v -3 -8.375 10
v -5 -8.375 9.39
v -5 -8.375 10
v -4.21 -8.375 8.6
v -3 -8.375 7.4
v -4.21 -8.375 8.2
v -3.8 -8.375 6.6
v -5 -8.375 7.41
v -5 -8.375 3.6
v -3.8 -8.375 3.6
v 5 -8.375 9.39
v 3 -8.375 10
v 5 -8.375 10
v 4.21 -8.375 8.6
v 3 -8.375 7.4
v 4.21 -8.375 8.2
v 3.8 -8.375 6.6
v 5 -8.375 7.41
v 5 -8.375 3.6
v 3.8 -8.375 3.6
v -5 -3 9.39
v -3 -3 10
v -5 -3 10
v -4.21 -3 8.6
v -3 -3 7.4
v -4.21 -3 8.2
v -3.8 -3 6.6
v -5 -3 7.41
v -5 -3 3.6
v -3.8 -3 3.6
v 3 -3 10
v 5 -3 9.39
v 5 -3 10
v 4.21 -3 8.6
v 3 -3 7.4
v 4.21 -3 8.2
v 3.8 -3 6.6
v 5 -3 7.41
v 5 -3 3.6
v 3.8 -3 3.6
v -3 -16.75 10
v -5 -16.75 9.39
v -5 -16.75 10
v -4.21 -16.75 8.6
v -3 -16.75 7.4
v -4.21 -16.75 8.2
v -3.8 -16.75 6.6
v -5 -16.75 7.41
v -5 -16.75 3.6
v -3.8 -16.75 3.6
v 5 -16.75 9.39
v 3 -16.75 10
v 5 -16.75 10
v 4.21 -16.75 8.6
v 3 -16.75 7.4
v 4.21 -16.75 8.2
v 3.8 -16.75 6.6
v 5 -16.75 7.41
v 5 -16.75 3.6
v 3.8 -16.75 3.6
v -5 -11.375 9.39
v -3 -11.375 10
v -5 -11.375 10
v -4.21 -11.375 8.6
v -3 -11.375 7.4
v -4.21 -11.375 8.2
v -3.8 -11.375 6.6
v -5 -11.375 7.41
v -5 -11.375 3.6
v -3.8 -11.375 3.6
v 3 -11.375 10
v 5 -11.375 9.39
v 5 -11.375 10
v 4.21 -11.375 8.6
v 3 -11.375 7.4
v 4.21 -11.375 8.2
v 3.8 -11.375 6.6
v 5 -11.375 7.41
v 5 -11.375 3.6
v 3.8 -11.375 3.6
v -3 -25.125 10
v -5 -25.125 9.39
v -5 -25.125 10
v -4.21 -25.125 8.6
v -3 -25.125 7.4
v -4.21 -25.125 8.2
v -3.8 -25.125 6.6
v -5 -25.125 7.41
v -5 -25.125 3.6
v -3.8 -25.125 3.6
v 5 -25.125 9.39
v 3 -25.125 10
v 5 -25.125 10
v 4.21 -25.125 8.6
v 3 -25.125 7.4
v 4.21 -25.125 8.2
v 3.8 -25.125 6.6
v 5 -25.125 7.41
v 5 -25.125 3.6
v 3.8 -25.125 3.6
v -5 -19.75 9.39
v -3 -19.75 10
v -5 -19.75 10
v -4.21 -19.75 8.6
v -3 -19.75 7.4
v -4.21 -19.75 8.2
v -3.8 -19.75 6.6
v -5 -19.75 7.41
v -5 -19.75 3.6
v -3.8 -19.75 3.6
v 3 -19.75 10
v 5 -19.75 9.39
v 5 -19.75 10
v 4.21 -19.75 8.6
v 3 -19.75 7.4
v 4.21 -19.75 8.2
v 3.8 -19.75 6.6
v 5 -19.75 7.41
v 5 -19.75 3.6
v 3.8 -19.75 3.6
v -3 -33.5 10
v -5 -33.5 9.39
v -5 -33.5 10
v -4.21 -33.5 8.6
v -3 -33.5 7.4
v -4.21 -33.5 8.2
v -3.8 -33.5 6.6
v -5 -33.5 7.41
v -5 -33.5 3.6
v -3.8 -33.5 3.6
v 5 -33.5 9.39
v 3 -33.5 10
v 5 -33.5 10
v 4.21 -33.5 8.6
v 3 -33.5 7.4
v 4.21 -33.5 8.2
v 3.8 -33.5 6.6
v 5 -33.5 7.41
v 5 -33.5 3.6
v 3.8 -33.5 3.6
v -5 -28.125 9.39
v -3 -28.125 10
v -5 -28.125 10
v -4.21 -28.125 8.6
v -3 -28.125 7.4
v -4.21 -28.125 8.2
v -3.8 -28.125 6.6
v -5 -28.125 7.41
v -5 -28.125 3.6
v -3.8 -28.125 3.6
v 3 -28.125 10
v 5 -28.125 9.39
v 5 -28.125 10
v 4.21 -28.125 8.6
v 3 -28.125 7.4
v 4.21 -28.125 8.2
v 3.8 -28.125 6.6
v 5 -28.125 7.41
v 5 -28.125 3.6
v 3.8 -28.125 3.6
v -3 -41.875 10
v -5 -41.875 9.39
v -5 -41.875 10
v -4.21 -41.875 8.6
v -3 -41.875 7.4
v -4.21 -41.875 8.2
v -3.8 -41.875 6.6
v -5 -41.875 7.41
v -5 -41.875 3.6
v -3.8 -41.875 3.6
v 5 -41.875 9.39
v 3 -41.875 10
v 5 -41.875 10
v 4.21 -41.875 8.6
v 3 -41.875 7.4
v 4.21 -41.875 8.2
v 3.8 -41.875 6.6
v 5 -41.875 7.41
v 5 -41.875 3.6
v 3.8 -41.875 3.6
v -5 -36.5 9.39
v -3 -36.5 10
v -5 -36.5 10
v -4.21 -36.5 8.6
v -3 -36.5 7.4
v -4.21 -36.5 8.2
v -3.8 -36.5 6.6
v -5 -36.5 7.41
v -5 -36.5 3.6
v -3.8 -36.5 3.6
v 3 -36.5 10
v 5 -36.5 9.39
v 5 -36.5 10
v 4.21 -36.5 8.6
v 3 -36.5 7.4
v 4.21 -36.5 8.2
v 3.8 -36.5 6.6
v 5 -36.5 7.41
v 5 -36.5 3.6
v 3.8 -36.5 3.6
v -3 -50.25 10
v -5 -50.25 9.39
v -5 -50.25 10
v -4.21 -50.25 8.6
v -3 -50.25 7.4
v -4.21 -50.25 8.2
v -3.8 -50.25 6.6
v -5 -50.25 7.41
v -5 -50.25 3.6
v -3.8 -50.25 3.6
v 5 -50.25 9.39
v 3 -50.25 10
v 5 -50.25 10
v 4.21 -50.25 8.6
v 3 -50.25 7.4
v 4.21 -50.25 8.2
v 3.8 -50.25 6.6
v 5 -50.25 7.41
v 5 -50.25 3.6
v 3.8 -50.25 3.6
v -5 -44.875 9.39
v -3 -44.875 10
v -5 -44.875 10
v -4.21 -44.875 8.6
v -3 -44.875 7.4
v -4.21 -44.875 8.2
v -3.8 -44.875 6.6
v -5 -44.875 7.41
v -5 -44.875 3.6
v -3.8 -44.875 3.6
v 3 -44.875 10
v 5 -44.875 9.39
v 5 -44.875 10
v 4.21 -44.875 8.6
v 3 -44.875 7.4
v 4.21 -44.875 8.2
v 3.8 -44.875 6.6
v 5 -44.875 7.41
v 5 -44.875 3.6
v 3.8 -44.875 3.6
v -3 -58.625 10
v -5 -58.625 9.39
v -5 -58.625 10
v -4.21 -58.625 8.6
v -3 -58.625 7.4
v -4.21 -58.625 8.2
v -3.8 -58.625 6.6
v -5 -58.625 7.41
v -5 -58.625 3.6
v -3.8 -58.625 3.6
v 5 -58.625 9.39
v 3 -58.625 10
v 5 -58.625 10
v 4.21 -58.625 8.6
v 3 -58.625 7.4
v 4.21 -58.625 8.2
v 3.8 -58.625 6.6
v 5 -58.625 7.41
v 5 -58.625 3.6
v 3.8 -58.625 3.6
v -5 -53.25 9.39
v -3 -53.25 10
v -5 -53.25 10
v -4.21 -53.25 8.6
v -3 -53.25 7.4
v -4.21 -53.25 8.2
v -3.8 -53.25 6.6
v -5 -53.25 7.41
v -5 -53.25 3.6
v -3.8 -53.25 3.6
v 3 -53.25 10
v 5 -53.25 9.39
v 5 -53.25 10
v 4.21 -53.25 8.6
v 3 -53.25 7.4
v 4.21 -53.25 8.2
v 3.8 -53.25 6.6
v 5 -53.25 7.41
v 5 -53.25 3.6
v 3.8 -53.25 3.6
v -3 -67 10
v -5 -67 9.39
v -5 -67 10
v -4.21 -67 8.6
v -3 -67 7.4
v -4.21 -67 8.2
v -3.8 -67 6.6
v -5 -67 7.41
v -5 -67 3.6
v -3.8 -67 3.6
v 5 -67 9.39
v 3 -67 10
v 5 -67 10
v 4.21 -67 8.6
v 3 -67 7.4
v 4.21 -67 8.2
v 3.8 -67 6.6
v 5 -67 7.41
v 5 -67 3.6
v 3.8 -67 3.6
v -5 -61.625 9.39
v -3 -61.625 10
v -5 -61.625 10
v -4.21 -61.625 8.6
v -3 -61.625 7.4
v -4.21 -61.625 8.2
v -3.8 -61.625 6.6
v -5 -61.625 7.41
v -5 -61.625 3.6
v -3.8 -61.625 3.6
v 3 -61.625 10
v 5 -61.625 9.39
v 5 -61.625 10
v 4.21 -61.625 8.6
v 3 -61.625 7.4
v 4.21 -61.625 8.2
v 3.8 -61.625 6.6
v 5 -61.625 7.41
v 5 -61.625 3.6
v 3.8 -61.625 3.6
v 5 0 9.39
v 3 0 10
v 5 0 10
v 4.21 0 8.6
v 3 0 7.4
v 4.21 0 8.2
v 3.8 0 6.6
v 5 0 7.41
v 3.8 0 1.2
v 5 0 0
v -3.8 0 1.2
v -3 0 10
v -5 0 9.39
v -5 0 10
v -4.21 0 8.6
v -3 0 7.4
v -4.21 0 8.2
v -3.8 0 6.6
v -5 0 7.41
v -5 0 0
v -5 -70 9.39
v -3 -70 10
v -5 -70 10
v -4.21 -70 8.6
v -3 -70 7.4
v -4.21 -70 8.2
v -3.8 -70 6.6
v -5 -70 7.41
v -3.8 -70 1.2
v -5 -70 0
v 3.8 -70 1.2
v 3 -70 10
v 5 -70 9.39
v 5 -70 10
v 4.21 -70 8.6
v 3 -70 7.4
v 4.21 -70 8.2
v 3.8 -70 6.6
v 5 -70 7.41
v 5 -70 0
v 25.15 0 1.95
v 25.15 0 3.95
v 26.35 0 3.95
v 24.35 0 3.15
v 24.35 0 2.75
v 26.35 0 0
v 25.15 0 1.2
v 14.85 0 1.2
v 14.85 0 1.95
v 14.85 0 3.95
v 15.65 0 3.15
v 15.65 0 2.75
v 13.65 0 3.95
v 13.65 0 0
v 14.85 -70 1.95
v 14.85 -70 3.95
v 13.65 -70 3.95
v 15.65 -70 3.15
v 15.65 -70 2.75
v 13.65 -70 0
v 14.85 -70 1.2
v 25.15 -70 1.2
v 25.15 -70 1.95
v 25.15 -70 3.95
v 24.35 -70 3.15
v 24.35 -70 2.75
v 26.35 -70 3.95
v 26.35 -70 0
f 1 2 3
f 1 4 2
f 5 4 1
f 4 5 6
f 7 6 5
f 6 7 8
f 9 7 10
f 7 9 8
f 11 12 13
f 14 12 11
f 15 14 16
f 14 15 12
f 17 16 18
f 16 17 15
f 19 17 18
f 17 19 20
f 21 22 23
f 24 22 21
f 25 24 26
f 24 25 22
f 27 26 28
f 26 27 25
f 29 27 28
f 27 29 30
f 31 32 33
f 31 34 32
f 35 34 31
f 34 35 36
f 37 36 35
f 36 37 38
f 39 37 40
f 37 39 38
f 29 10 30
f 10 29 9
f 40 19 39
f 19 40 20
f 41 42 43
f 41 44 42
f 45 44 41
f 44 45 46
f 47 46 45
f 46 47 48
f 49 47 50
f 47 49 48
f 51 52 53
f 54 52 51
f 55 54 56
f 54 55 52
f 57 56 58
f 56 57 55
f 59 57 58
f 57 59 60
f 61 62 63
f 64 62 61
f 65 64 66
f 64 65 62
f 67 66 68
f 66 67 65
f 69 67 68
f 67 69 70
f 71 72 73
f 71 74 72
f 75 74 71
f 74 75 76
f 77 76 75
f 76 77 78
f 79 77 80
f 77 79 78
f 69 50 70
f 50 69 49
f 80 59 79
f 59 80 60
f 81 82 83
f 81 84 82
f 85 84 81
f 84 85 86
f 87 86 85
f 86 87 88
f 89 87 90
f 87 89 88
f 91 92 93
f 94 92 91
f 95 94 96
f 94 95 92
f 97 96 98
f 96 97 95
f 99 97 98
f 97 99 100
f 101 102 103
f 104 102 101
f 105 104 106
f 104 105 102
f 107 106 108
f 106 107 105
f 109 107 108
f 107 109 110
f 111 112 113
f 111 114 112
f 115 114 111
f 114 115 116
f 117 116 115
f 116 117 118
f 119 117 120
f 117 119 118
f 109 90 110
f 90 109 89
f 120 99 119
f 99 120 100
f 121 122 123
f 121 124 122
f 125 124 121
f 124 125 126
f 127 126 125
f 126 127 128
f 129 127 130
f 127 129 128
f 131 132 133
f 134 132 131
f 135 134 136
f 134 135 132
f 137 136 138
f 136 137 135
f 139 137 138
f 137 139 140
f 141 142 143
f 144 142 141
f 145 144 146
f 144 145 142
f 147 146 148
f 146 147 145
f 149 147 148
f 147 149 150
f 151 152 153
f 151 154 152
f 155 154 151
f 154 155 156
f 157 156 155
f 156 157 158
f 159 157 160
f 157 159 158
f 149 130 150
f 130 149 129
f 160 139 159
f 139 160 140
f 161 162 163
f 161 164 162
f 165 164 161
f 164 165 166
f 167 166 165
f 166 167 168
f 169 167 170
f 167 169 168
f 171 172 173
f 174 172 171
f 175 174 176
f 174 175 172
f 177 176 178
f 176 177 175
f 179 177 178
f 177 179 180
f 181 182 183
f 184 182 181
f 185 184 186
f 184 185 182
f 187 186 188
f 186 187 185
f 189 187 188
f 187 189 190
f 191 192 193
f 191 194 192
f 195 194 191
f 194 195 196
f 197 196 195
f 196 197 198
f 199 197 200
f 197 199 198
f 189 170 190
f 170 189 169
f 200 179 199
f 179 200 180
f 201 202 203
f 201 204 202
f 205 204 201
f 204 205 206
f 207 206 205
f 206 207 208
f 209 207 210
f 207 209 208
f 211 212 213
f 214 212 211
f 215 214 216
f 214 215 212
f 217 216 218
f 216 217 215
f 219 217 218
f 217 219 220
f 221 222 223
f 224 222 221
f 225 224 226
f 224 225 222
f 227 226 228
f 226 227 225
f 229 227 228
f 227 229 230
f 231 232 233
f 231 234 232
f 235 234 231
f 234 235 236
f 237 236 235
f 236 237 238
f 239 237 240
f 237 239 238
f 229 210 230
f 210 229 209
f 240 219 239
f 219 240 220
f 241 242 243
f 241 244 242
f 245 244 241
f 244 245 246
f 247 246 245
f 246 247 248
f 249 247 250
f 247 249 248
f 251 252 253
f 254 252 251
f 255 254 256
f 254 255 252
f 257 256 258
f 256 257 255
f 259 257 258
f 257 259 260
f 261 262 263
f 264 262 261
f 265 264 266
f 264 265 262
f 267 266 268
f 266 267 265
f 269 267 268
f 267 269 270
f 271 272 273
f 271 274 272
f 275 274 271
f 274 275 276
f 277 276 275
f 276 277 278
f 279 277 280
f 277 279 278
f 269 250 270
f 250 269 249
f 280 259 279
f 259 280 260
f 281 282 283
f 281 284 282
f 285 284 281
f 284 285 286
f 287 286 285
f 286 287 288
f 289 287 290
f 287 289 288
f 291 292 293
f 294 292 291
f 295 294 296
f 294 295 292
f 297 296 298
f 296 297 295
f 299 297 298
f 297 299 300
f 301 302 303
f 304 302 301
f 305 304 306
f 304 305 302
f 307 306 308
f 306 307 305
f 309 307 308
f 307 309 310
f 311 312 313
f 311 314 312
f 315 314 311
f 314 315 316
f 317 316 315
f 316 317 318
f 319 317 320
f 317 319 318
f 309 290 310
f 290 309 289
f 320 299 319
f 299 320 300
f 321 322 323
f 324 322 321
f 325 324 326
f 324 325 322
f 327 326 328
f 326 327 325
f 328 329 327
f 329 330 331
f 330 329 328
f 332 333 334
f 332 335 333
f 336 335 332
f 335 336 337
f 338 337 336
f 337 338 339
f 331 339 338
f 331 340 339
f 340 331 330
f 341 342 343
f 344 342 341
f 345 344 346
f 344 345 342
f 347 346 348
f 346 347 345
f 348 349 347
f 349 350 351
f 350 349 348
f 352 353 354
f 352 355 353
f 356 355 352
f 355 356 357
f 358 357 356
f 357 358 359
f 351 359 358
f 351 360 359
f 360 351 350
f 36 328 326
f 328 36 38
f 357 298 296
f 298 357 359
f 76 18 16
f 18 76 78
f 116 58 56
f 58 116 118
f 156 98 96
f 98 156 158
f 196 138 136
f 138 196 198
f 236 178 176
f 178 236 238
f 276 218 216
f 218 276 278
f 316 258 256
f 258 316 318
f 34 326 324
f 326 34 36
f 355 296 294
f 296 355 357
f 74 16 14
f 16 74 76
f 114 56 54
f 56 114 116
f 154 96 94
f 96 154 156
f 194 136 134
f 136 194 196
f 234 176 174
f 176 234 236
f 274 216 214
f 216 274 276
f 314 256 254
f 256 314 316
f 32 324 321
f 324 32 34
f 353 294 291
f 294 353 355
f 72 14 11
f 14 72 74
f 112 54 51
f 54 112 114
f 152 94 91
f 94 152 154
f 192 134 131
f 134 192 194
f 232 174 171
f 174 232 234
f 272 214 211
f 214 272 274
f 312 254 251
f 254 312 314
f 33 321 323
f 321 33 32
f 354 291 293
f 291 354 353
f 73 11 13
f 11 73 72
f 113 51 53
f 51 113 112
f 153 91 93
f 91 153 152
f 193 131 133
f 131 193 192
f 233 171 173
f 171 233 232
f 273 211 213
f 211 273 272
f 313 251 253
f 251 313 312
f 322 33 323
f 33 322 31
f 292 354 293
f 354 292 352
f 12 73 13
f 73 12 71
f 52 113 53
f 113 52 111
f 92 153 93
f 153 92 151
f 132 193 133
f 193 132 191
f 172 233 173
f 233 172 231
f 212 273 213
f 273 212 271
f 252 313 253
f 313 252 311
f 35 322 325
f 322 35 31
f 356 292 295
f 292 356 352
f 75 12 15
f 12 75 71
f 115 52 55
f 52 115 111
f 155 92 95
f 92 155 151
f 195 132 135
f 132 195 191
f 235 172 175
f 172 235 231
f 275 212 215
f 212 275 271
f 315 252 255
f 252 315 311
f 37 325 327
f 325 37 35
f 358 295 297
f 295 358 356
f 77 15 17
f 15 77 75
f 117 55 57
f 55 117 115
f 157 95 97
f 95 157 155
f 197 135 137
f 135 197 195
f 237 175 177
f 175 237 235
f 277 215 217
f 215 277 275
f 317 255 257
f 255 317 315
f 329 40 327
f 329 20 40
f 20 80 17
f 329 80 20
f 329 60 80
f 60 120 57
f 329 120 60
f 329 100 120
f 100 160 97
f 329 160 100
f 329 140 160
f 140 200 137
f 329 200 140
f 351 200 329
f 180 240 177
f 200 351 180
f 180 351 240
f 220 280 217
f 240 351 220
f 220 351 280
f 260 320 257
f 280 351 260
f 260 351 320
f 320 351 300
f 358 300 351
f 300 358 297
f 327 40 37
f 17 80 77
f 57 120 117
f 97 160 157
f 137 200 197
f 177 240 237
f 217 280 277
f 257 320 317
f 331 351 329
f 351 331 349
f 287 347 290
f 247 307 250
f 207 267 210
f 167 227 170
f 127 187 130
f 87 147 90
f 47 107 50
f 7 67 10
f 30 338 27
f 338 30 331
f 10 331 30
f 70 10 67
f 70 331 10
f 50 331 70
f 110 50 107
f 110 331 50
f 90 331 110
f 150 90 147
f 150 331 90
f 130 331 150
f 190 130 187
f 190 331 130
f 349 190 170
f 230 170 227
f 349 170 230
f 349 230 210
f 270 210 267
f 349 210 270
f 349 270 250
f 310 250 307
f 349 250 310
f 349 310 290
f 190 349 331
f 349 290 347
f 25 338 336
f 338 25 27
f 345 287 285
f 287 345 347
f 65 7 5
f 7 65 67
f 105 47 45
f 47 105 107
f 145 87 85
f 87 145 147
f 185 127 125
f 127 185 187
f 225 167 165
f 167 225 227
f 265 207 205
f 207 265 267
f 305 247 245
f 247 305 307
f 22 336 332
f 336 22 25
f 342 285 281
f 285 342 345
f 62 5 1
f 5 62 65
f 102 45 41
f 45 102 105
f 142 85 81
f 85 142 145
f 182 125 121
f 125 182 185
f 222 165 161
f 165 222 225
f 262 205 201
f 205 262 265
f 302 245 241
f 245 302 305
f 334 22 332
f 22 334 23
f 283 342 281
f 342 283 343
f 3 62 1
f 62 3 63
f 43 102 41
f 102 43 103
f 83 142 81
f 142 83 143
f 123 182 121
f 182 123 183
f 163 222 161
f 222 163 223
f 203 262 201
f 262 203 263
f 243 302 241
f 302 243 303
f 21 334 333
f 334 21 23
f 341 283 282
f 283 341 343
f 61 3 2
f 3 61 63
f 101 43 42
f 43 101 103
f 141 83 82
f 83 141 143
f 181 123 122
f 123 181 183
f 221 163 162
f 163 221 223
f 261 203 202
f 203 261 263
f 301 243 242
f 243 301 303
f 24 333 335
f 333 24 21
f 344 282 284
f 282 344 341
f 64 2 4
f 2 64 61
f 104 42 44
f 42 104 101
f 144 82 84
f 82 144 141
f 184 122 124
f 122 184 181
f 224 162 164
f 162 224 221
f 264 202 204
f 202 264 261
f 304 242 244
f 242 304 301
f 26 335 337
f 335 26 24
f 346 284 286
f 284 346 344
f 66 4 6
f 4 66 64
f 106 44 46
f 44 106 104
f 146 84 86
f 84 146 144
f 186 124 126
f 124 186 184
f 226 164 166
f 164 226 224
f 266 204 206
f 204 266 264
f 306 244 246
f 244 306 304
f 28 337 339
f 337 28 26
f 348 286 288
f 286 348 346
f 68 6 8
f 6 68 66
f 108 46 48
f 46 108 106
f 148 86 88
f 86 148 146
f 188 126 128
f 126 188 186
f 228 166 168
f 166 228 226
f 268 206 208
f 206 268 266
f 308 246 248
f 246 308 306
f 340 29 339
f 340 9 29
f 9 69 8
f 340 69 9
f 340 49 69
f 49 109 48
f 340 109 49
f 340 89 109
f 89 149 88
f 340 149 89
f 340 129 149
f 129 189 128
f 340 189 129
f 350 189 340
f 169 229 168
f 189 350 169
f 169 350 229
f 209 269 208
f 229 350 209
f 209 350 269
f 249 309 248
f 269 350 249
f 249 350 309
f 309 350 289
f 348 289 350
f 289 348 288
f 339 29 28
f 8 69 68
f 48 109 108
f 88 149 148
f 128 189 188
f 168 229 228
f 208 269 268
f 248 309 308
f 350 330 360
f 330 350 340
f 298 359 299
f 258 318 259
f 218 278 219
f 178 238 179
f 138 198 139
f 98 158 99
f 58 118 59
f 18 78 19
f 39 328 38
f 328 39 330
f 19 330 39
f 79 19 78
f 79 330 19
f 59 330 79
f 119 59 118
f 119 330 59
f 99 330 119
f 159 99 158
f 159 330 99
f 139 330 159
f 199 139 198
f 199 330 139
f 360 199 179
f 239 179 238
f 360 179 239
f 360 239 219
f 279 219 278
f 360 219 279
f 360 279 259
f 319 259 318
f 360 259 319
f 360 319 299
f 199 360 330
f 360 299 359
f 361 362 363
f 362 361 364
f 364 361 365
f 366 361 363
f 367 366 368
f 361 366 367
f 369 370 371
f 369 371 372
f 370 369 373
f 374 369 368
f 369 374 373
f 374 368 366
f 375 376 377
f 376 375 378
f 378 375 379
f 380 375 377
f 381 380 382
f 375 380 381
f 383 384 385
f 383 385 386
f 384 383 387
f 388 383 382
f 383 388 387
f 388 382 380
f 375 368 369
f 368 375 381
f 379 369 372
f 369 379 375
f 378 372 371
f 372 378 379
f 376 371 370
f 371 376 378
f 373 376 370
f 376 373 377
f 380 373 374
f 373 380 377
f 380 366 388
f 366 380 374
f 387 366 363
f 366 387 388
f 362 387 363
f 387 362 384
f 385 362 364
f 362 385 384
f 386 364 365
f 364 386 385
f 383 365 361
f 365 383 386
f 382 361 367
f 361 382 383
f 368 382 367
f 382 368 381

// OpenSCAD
/*
 * Parametric cable duct with cover
 * ========================================
 *
 * Create your own custom cable duct with desired dimensions and matching top cover.
 *
 * Created by Thomas Hessling <mail@dream-dimensions.de>. 
 * License: Creative Commons - Attribution - Non-Commercial - Share Alike
 *
 * https://www.dream-dimensions.de
 * https://www.thingiverse.com/thing:3775502
 *
 * ChangeLog:
 *  - Initial release (2019-07-28)
 *    model creation works, first print successful.
 */
 
 
/*
 * Define the cable duct's final dimensions.
 * All values are millimetres. 
 */
 

/* [General settings] */
// Cable duct overall length
cd_length = 70;
// Cable duct width
cd_width = 10;
// Cable duct height
cd_height = 10;
// Number of fins
cd_fins = 8;
// Fin width
cd_fin_width = 3;
// Shell thickness (should be a multiple of your nozzle diameter)
cd_shell = 1.2;

// Which part to create? Duct, cover or both.
part = "both"; // [duct:Cable duct,cover:Duct top cover,both:Both parts]


/* [Mounting feature settings] */
// Mounting feature height
mf_length = 2;
// Mounting feature angle 
mf_angle = 45;
// Mounting feature depth
mf_depth = 0.8;
// Mounting feature offset from top
mf_top_offset = 0.6;
// Tolerance between cover and duct
mf_top_tolerance = 0.15;

/* [Hidden] */
// the color
col = [0.3,0.5,0.85];
// safety offset for boolean operations, prevents spurious surfaces
s = 0.01;

cd_fin_spacing = (cd_length - cd_fin_width) / cd_fins;
cd_slit_width = cd_fin_spacing - cd_fin_width;


// Create the part
print_part();



/*
	Create the part based on the part-variable: duct, cover or both
*/
module print_part()
{
	if (part == "duct") {
		create_duct();		
	} else if (part == "cover") {
		create_cover();		
	} else if (part == "both") {
		create_duct();
		create_cover();
	}
}


/*
	Generates a trapezoidal profile that serves as a mounting feature for a	cover.
*/
module clip_profile()
{
	// Make the the angle is properly defined and does not lead to geometry errors
	assert(mf_angle > 0, "The angle must be greater than 0 deg.");
	assert(mf_angle <= 90, "The angle cannot be greater than 90 deg.");
	assert(mf_depth*tan(90-mf_angle)*2 <= mf_length, 
		   "The mounting feature length is too small. Increase length or the angle.");
	
	polyp = [[0,0], 
			 [0,-mf_length], 
			 [mf_depth,-mf_length+mf_depth*tan(90-mf_angle)], 
			 [mf_depth,-mf_depth*tan(90-mf_angle)]];
	polygon(polyp);
}


/*
	Cut profile for the interior of the rectangle, taking into account the mounting feature.
*/
module inner_duct_profile()
{
	cd_hwidth = cd_width/2;
	polygon([[cd_hwidth-mf_depth-cd_shell, cd_height+s],
	 [cd_hwidth-mf_depth-cd_shell, cd_height-mf_length-mf_top_offset],
	 [cd_hwidth-cd_shell, cd_height-mf_length-mf_top_offset-mf_depth*tan(45)],
	 [cd_hwidth-cd_shell, cd_shell],
	 [0, cd_shell],
	 [0, cd_height+s]]);
}

/*
	The duct's cross-sectional profile, used in an extrusion.
*/
module create_duct_profile()
{
	/*
		Basic shape: rectangle
		Subtract the mounting features from it, and also the interior bulk.
		This then serves as an extrusion profile.	
	*/
	difference() {
		difference() {
			difference() {
				scale([cd_width, cd_height])
				translate([-0.5, 0])
				square(1, center=false);
				
				union() {
					translate([-cd_width/2-s, cd_height-mf_top_offset])
					clip_profile();
					
					translate([cd_width/2+s, cd_height-mf_top_offset])
					mirror([1, 0])
					clip_profile();
				}
			}
		}
		union() {
			inner_duct_profile();
			mirror([1, 0])
			inner_duct_profile();
		}
	}

}

/*
	Create the cover profile to be extruded.
*/
module create_cover_profile()
{
	union() {
		translate([cd_width/2+mf_top_tolerance, cd_height-mf_top_offset, 0])
		mirror([1, 0])
		clip_profile();
		
		translate([-cd_width/2-mf_top_tolerance, cd_height-mf_top_offset, 0])
		clip_profile();
		
		polygon([[cd_width/2+mf_top_tolerance, cd_height-mf_top_offset-mf_length],
				 [cd_width/2+mf_top_tolerance, cd_height+mf_top_tolerance],
				 [-cd_width/2-mf_top_tolerance, cd_height+mf_top_tolerance],
				 [-cd_width/2-mf_top_tolerance, cd_height-mf_top_offset-mf_length],
				 [-cd_width/2-mf_top_tolerance-cd_shell, cd_height-mf_top_offset-mf_length],
				 [-cd_width/2-mf_top_tolerance-cd_shell, cd_height+mf_top_tolerance+cd_shell],
				 [cd_width/2+mf_top_tolerance+cd_shell, cd_height+mf_top_tolerance+cd_shell],
				 [cd_width/2+mf_top_tolerance+cd_shell, cd_height-mf_top_offset-mf_length],
				]);
	}
}

/*
	Extrude the duct's cross-section profile, cut boxes in regular distance to create the
	"fins" and cut holes in the bottom to save material.
*/
module create_duct()
{
	color(col)
	rotate(90, [1, 0, 0])
	difference() {
		linear_extrude(height=cd_length, center=false)
		create_duct_profile();
	

		union() {
			for (i = [0:cd_fins-1]) {
				translate([-cd_width/2-1, 3*cd_shell, i*cd_fin_spacing+cd_fin_width])
				cube([cd_width+2, cd_height+1, cd_fin_spacing-cd_fin_width]);
			}
		}
	}
	
}


/*
	Create a cover for the duct.
*/
module create_cover() 
{
	color(col)
	translate([2*cd_width, 0, cd_height+mf_top_tolerance+cd_shell])
	rotate(180, [0, 1, 0])
	rotate(90, [1, 0, 0])
	linear_extrude(height=cd_length, center=false)
	create_cover_profile();
}
